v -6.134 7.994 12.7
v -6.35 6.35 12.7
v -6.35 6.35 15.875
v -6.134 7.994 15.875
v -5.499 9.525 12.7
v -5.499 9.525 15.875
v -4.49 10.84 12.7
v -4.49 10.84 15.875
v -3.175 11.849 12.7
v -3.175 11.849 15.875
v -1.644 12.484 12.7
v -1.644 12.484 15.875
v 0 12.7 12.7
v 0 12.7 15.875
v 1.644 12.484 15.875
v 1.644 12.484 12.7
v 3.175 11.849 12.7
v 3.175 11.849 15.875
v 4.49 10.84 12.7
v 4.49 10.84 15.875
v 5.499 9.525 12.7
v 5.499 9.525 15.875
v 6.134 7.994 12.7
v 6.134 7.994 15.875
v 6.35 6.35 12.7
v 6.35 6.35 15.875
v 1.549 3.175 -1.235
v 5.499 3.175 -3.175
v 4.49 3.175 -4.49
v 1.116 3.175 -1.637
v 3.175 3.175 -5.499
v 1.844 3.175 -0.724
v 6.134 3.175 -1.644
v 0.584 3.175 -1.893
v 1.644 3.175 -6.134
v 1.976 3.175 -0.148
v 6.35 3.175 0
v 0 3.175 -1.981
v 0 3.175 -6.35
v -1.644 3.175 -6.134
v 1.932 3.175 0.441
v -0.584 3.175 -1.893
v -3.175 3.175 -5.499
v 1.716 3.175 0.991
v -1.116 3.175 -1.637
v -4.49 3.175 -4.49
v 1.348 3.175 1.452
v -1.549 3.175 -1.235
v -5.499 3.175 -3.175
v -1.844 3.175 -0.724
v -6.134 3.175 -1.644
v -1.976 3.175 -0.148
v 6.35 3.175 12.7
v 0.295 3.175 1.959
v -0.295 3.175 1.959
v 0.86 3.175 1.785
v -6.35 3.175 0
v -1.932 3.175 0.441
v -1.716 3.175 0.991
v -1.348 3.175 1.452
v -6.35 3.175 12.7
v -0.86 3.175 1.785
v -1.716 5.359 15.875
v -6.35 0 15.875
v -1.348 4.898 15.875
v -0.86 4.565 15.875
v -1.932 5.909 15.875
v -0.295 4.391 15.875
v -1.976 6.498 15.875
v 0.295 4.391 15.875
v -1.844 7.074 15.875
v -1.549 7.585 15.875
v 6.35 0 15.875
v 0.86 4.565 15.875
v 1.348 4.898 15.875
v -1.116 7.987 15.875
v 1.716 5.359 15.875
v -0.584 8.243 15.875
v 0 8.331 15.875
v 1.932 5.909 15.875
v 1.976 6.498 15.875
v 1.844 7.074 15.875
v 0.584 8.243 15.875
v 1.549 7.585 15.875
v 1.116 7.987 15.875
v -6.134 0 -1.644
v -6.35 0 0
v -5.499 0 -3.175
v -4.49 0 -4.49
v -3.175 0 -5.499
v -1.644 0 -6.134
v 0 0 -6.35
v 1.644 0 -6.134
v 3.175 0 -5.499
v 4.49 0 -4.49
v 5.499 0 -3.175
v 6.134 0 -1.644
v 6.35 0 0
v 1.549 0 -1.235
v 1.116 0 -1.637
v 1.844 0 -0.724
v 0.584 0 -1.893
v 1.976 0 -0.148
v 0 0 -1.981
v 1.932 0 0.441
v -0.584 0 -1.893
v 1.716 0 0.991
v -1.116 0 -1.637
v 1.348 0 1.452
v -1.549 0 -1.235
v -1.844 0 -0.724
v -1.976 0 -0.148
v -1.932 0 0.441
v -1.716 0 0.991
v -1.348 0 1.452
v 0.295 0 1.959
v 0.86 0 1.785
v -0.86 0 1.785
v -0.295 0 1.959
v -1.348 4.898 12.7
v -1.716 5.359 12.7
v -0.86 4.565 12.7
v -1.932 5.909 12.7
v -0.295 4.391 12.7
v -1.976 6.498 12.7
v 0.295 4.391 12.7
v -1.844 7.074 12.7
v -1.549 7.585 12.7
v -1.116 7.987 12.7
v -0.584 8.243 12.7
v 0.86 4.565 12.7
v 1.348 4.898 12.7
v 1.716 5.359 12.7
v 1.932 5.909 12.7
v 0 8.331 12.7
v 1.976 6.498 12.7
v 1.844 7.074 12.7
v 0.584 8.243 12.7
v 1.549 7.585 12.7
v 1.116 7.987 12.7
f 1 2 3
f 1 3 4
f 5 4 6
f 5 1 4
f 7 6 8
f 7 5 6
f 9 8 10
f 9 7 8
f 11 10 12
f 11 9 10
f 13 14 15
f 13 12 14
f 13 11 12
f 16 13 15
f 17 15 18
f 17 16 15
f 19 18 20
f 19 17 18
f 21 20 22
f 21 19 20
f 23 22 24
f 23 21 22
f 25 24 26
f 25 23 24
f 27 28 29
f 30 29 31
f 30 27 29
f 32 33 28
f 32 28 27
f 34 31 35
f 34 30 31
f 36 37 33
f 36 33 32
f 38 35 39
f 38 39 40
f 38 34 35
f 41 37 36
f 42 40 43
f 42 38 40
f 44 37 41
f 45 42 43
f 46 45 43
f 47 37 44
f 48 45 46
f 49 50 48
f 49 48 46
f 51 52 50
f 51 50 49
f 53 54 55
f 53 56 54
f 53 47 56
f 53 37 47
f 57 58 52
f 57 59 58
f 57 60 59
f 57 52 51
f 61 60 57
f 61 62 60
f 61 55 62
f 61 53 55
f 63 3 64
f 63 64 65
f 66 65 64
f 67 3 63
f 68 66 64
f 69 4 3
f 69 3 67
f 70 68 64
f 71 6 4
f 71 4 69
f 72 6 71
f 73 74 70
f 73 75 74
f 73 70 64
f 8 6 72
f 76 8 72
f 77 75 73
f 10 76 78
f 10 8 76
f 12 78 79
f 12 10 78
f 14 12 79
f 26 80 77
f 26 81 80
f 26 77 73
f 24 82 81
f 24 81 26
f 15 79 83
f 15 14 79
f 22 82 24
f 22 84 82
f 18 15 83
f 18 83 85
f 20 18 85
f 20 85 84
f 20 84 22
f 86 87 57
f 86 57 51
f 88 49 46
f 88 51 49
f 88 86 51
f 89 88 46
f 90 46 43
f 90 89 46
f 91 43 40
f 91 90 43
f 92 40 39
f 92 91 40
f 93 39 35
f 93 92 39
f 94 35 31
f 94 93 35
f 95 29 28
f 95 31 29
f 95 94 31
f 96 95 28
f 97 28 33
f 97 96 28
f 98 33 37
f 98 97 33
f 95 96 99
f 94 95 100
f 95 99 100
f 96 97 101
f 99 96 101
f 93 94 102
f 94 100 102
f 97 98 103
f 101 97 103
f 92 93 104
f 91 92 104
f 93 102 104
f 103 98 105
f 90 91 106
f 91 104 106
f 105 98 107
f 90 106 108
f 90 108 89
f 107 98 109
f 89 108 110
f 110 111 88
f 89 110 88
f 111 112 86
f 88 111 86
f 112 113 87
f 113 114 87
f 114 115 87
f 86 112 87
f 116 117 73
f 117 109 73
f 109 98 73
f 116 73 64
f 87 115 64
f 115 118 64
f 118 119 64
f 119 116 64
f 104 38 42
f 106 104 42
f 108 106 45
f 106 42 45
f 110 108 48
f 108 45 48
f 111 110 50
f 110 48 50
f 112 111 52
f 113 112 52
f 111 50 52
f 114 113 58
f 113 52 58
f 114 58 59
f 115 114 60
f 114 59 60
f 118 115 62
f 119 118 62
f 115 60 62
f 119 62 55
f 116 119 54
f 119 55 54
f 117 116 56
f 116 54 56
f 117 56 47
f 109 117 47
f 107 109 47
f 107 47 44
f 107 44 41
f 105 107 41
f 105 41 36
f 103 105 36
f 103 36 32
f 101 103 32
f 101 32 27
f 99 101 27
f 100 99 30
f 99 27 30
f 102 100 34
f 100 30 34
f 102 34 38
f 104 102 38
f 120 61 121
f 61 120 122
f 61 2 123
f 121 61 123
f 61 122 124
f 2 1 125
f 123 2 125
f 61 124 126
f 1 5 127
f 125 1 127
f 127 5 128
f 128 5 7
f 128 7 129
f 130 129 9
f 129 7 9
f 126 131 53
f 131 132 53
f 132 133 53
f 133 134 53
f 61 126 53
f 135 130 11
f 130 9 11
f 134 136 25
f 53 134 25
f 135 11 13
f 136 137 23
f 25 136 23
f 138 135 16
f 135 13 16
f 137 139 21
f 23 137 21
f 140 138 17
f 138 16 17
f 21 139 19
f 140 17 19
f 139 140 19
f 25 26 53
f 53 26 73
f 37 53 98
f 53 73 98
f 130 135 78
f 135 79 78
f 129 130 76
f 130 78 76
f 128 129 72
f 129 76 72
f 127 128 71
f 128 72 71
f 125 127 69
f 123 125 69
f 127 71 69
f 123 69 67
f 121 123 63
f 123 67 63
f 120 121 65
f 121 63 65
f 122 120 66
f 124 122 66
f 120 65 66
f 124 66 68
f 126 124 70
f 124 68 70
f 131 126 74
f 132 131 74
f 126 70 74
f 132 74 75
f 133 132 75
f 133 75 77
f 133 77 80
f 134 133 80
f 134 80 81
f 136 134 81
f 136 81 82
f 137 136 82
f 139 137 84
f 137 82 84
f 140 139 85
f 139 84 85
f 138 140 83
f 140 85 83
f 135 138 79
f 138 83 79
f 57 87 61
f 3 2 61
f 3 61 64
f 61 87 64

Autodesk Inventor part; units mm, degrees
ref_plane "YZ Plane" through (0, 0, 0) normal (1, 0, 0) x (0, 1, 0)
ref_plane "XZ Plane" through (0, 0, 0) normal (0, 1, 0) x (-1, 0, 0)
ref_plane "XY Plane" through (0, 0, 0) normal (0, 0, 1) x (1, 0, 0)
sketch "Sketch1" plane through (0, 0, 0) normal (0, 1, 0) x (-1, 0, 0)
  circle A0 centre (0, 0) radius 6.35
  line L0 (6.35, 0) -> (6.35, 12.7)
  line L1 (6.35, 12.7) -> (-6.35, 12.7)
  line L2 (-6.35, 12.7) -> (-6.35, 0)
  dimension "d0" = 12.7
  dimension "d1" = 12.7
extrude "Extrusion1" add sketch "Sketch1" along normal blind 3.175
sketch "Sketch2" plane through (-6.35, 0, 12.7) normal (0, 0, 1) x (1, 0, 0)
  circle A0 centre (6.35, 6.35) radius 6.35
  line L0 (0, 6.35) -> (0, 0)
  line L1 (0, 0) -> (12.7, 0) projected
  line L2 (0, 0) -> (12.7, 0)
  line L3 (12.7, 0) -> (12.7, 6.35)
  point P0 (6.35, 0)
  dimension "d4" = 12.7
  dimension "d5" = 6.35
extrude "Extrusion2" add sketch "Sketch2" along normal blind 3.175
hole "Hole1" at (0, 0, 0) direction (0, 1, 0) diameter 3.9624 depth 13.6144 thread size "10-32 UNF" class "2B" standard "ANSI Unified Screw Threads"
hole "Hole2" at (0, 6.35, 12.7) direction (0, 0, 1) diameter 3.9624 end through all thread size "10-32 UNF" class "2B" standard "ANSI Unified Screw Threads"
properties part number "Rotational Linkage"
